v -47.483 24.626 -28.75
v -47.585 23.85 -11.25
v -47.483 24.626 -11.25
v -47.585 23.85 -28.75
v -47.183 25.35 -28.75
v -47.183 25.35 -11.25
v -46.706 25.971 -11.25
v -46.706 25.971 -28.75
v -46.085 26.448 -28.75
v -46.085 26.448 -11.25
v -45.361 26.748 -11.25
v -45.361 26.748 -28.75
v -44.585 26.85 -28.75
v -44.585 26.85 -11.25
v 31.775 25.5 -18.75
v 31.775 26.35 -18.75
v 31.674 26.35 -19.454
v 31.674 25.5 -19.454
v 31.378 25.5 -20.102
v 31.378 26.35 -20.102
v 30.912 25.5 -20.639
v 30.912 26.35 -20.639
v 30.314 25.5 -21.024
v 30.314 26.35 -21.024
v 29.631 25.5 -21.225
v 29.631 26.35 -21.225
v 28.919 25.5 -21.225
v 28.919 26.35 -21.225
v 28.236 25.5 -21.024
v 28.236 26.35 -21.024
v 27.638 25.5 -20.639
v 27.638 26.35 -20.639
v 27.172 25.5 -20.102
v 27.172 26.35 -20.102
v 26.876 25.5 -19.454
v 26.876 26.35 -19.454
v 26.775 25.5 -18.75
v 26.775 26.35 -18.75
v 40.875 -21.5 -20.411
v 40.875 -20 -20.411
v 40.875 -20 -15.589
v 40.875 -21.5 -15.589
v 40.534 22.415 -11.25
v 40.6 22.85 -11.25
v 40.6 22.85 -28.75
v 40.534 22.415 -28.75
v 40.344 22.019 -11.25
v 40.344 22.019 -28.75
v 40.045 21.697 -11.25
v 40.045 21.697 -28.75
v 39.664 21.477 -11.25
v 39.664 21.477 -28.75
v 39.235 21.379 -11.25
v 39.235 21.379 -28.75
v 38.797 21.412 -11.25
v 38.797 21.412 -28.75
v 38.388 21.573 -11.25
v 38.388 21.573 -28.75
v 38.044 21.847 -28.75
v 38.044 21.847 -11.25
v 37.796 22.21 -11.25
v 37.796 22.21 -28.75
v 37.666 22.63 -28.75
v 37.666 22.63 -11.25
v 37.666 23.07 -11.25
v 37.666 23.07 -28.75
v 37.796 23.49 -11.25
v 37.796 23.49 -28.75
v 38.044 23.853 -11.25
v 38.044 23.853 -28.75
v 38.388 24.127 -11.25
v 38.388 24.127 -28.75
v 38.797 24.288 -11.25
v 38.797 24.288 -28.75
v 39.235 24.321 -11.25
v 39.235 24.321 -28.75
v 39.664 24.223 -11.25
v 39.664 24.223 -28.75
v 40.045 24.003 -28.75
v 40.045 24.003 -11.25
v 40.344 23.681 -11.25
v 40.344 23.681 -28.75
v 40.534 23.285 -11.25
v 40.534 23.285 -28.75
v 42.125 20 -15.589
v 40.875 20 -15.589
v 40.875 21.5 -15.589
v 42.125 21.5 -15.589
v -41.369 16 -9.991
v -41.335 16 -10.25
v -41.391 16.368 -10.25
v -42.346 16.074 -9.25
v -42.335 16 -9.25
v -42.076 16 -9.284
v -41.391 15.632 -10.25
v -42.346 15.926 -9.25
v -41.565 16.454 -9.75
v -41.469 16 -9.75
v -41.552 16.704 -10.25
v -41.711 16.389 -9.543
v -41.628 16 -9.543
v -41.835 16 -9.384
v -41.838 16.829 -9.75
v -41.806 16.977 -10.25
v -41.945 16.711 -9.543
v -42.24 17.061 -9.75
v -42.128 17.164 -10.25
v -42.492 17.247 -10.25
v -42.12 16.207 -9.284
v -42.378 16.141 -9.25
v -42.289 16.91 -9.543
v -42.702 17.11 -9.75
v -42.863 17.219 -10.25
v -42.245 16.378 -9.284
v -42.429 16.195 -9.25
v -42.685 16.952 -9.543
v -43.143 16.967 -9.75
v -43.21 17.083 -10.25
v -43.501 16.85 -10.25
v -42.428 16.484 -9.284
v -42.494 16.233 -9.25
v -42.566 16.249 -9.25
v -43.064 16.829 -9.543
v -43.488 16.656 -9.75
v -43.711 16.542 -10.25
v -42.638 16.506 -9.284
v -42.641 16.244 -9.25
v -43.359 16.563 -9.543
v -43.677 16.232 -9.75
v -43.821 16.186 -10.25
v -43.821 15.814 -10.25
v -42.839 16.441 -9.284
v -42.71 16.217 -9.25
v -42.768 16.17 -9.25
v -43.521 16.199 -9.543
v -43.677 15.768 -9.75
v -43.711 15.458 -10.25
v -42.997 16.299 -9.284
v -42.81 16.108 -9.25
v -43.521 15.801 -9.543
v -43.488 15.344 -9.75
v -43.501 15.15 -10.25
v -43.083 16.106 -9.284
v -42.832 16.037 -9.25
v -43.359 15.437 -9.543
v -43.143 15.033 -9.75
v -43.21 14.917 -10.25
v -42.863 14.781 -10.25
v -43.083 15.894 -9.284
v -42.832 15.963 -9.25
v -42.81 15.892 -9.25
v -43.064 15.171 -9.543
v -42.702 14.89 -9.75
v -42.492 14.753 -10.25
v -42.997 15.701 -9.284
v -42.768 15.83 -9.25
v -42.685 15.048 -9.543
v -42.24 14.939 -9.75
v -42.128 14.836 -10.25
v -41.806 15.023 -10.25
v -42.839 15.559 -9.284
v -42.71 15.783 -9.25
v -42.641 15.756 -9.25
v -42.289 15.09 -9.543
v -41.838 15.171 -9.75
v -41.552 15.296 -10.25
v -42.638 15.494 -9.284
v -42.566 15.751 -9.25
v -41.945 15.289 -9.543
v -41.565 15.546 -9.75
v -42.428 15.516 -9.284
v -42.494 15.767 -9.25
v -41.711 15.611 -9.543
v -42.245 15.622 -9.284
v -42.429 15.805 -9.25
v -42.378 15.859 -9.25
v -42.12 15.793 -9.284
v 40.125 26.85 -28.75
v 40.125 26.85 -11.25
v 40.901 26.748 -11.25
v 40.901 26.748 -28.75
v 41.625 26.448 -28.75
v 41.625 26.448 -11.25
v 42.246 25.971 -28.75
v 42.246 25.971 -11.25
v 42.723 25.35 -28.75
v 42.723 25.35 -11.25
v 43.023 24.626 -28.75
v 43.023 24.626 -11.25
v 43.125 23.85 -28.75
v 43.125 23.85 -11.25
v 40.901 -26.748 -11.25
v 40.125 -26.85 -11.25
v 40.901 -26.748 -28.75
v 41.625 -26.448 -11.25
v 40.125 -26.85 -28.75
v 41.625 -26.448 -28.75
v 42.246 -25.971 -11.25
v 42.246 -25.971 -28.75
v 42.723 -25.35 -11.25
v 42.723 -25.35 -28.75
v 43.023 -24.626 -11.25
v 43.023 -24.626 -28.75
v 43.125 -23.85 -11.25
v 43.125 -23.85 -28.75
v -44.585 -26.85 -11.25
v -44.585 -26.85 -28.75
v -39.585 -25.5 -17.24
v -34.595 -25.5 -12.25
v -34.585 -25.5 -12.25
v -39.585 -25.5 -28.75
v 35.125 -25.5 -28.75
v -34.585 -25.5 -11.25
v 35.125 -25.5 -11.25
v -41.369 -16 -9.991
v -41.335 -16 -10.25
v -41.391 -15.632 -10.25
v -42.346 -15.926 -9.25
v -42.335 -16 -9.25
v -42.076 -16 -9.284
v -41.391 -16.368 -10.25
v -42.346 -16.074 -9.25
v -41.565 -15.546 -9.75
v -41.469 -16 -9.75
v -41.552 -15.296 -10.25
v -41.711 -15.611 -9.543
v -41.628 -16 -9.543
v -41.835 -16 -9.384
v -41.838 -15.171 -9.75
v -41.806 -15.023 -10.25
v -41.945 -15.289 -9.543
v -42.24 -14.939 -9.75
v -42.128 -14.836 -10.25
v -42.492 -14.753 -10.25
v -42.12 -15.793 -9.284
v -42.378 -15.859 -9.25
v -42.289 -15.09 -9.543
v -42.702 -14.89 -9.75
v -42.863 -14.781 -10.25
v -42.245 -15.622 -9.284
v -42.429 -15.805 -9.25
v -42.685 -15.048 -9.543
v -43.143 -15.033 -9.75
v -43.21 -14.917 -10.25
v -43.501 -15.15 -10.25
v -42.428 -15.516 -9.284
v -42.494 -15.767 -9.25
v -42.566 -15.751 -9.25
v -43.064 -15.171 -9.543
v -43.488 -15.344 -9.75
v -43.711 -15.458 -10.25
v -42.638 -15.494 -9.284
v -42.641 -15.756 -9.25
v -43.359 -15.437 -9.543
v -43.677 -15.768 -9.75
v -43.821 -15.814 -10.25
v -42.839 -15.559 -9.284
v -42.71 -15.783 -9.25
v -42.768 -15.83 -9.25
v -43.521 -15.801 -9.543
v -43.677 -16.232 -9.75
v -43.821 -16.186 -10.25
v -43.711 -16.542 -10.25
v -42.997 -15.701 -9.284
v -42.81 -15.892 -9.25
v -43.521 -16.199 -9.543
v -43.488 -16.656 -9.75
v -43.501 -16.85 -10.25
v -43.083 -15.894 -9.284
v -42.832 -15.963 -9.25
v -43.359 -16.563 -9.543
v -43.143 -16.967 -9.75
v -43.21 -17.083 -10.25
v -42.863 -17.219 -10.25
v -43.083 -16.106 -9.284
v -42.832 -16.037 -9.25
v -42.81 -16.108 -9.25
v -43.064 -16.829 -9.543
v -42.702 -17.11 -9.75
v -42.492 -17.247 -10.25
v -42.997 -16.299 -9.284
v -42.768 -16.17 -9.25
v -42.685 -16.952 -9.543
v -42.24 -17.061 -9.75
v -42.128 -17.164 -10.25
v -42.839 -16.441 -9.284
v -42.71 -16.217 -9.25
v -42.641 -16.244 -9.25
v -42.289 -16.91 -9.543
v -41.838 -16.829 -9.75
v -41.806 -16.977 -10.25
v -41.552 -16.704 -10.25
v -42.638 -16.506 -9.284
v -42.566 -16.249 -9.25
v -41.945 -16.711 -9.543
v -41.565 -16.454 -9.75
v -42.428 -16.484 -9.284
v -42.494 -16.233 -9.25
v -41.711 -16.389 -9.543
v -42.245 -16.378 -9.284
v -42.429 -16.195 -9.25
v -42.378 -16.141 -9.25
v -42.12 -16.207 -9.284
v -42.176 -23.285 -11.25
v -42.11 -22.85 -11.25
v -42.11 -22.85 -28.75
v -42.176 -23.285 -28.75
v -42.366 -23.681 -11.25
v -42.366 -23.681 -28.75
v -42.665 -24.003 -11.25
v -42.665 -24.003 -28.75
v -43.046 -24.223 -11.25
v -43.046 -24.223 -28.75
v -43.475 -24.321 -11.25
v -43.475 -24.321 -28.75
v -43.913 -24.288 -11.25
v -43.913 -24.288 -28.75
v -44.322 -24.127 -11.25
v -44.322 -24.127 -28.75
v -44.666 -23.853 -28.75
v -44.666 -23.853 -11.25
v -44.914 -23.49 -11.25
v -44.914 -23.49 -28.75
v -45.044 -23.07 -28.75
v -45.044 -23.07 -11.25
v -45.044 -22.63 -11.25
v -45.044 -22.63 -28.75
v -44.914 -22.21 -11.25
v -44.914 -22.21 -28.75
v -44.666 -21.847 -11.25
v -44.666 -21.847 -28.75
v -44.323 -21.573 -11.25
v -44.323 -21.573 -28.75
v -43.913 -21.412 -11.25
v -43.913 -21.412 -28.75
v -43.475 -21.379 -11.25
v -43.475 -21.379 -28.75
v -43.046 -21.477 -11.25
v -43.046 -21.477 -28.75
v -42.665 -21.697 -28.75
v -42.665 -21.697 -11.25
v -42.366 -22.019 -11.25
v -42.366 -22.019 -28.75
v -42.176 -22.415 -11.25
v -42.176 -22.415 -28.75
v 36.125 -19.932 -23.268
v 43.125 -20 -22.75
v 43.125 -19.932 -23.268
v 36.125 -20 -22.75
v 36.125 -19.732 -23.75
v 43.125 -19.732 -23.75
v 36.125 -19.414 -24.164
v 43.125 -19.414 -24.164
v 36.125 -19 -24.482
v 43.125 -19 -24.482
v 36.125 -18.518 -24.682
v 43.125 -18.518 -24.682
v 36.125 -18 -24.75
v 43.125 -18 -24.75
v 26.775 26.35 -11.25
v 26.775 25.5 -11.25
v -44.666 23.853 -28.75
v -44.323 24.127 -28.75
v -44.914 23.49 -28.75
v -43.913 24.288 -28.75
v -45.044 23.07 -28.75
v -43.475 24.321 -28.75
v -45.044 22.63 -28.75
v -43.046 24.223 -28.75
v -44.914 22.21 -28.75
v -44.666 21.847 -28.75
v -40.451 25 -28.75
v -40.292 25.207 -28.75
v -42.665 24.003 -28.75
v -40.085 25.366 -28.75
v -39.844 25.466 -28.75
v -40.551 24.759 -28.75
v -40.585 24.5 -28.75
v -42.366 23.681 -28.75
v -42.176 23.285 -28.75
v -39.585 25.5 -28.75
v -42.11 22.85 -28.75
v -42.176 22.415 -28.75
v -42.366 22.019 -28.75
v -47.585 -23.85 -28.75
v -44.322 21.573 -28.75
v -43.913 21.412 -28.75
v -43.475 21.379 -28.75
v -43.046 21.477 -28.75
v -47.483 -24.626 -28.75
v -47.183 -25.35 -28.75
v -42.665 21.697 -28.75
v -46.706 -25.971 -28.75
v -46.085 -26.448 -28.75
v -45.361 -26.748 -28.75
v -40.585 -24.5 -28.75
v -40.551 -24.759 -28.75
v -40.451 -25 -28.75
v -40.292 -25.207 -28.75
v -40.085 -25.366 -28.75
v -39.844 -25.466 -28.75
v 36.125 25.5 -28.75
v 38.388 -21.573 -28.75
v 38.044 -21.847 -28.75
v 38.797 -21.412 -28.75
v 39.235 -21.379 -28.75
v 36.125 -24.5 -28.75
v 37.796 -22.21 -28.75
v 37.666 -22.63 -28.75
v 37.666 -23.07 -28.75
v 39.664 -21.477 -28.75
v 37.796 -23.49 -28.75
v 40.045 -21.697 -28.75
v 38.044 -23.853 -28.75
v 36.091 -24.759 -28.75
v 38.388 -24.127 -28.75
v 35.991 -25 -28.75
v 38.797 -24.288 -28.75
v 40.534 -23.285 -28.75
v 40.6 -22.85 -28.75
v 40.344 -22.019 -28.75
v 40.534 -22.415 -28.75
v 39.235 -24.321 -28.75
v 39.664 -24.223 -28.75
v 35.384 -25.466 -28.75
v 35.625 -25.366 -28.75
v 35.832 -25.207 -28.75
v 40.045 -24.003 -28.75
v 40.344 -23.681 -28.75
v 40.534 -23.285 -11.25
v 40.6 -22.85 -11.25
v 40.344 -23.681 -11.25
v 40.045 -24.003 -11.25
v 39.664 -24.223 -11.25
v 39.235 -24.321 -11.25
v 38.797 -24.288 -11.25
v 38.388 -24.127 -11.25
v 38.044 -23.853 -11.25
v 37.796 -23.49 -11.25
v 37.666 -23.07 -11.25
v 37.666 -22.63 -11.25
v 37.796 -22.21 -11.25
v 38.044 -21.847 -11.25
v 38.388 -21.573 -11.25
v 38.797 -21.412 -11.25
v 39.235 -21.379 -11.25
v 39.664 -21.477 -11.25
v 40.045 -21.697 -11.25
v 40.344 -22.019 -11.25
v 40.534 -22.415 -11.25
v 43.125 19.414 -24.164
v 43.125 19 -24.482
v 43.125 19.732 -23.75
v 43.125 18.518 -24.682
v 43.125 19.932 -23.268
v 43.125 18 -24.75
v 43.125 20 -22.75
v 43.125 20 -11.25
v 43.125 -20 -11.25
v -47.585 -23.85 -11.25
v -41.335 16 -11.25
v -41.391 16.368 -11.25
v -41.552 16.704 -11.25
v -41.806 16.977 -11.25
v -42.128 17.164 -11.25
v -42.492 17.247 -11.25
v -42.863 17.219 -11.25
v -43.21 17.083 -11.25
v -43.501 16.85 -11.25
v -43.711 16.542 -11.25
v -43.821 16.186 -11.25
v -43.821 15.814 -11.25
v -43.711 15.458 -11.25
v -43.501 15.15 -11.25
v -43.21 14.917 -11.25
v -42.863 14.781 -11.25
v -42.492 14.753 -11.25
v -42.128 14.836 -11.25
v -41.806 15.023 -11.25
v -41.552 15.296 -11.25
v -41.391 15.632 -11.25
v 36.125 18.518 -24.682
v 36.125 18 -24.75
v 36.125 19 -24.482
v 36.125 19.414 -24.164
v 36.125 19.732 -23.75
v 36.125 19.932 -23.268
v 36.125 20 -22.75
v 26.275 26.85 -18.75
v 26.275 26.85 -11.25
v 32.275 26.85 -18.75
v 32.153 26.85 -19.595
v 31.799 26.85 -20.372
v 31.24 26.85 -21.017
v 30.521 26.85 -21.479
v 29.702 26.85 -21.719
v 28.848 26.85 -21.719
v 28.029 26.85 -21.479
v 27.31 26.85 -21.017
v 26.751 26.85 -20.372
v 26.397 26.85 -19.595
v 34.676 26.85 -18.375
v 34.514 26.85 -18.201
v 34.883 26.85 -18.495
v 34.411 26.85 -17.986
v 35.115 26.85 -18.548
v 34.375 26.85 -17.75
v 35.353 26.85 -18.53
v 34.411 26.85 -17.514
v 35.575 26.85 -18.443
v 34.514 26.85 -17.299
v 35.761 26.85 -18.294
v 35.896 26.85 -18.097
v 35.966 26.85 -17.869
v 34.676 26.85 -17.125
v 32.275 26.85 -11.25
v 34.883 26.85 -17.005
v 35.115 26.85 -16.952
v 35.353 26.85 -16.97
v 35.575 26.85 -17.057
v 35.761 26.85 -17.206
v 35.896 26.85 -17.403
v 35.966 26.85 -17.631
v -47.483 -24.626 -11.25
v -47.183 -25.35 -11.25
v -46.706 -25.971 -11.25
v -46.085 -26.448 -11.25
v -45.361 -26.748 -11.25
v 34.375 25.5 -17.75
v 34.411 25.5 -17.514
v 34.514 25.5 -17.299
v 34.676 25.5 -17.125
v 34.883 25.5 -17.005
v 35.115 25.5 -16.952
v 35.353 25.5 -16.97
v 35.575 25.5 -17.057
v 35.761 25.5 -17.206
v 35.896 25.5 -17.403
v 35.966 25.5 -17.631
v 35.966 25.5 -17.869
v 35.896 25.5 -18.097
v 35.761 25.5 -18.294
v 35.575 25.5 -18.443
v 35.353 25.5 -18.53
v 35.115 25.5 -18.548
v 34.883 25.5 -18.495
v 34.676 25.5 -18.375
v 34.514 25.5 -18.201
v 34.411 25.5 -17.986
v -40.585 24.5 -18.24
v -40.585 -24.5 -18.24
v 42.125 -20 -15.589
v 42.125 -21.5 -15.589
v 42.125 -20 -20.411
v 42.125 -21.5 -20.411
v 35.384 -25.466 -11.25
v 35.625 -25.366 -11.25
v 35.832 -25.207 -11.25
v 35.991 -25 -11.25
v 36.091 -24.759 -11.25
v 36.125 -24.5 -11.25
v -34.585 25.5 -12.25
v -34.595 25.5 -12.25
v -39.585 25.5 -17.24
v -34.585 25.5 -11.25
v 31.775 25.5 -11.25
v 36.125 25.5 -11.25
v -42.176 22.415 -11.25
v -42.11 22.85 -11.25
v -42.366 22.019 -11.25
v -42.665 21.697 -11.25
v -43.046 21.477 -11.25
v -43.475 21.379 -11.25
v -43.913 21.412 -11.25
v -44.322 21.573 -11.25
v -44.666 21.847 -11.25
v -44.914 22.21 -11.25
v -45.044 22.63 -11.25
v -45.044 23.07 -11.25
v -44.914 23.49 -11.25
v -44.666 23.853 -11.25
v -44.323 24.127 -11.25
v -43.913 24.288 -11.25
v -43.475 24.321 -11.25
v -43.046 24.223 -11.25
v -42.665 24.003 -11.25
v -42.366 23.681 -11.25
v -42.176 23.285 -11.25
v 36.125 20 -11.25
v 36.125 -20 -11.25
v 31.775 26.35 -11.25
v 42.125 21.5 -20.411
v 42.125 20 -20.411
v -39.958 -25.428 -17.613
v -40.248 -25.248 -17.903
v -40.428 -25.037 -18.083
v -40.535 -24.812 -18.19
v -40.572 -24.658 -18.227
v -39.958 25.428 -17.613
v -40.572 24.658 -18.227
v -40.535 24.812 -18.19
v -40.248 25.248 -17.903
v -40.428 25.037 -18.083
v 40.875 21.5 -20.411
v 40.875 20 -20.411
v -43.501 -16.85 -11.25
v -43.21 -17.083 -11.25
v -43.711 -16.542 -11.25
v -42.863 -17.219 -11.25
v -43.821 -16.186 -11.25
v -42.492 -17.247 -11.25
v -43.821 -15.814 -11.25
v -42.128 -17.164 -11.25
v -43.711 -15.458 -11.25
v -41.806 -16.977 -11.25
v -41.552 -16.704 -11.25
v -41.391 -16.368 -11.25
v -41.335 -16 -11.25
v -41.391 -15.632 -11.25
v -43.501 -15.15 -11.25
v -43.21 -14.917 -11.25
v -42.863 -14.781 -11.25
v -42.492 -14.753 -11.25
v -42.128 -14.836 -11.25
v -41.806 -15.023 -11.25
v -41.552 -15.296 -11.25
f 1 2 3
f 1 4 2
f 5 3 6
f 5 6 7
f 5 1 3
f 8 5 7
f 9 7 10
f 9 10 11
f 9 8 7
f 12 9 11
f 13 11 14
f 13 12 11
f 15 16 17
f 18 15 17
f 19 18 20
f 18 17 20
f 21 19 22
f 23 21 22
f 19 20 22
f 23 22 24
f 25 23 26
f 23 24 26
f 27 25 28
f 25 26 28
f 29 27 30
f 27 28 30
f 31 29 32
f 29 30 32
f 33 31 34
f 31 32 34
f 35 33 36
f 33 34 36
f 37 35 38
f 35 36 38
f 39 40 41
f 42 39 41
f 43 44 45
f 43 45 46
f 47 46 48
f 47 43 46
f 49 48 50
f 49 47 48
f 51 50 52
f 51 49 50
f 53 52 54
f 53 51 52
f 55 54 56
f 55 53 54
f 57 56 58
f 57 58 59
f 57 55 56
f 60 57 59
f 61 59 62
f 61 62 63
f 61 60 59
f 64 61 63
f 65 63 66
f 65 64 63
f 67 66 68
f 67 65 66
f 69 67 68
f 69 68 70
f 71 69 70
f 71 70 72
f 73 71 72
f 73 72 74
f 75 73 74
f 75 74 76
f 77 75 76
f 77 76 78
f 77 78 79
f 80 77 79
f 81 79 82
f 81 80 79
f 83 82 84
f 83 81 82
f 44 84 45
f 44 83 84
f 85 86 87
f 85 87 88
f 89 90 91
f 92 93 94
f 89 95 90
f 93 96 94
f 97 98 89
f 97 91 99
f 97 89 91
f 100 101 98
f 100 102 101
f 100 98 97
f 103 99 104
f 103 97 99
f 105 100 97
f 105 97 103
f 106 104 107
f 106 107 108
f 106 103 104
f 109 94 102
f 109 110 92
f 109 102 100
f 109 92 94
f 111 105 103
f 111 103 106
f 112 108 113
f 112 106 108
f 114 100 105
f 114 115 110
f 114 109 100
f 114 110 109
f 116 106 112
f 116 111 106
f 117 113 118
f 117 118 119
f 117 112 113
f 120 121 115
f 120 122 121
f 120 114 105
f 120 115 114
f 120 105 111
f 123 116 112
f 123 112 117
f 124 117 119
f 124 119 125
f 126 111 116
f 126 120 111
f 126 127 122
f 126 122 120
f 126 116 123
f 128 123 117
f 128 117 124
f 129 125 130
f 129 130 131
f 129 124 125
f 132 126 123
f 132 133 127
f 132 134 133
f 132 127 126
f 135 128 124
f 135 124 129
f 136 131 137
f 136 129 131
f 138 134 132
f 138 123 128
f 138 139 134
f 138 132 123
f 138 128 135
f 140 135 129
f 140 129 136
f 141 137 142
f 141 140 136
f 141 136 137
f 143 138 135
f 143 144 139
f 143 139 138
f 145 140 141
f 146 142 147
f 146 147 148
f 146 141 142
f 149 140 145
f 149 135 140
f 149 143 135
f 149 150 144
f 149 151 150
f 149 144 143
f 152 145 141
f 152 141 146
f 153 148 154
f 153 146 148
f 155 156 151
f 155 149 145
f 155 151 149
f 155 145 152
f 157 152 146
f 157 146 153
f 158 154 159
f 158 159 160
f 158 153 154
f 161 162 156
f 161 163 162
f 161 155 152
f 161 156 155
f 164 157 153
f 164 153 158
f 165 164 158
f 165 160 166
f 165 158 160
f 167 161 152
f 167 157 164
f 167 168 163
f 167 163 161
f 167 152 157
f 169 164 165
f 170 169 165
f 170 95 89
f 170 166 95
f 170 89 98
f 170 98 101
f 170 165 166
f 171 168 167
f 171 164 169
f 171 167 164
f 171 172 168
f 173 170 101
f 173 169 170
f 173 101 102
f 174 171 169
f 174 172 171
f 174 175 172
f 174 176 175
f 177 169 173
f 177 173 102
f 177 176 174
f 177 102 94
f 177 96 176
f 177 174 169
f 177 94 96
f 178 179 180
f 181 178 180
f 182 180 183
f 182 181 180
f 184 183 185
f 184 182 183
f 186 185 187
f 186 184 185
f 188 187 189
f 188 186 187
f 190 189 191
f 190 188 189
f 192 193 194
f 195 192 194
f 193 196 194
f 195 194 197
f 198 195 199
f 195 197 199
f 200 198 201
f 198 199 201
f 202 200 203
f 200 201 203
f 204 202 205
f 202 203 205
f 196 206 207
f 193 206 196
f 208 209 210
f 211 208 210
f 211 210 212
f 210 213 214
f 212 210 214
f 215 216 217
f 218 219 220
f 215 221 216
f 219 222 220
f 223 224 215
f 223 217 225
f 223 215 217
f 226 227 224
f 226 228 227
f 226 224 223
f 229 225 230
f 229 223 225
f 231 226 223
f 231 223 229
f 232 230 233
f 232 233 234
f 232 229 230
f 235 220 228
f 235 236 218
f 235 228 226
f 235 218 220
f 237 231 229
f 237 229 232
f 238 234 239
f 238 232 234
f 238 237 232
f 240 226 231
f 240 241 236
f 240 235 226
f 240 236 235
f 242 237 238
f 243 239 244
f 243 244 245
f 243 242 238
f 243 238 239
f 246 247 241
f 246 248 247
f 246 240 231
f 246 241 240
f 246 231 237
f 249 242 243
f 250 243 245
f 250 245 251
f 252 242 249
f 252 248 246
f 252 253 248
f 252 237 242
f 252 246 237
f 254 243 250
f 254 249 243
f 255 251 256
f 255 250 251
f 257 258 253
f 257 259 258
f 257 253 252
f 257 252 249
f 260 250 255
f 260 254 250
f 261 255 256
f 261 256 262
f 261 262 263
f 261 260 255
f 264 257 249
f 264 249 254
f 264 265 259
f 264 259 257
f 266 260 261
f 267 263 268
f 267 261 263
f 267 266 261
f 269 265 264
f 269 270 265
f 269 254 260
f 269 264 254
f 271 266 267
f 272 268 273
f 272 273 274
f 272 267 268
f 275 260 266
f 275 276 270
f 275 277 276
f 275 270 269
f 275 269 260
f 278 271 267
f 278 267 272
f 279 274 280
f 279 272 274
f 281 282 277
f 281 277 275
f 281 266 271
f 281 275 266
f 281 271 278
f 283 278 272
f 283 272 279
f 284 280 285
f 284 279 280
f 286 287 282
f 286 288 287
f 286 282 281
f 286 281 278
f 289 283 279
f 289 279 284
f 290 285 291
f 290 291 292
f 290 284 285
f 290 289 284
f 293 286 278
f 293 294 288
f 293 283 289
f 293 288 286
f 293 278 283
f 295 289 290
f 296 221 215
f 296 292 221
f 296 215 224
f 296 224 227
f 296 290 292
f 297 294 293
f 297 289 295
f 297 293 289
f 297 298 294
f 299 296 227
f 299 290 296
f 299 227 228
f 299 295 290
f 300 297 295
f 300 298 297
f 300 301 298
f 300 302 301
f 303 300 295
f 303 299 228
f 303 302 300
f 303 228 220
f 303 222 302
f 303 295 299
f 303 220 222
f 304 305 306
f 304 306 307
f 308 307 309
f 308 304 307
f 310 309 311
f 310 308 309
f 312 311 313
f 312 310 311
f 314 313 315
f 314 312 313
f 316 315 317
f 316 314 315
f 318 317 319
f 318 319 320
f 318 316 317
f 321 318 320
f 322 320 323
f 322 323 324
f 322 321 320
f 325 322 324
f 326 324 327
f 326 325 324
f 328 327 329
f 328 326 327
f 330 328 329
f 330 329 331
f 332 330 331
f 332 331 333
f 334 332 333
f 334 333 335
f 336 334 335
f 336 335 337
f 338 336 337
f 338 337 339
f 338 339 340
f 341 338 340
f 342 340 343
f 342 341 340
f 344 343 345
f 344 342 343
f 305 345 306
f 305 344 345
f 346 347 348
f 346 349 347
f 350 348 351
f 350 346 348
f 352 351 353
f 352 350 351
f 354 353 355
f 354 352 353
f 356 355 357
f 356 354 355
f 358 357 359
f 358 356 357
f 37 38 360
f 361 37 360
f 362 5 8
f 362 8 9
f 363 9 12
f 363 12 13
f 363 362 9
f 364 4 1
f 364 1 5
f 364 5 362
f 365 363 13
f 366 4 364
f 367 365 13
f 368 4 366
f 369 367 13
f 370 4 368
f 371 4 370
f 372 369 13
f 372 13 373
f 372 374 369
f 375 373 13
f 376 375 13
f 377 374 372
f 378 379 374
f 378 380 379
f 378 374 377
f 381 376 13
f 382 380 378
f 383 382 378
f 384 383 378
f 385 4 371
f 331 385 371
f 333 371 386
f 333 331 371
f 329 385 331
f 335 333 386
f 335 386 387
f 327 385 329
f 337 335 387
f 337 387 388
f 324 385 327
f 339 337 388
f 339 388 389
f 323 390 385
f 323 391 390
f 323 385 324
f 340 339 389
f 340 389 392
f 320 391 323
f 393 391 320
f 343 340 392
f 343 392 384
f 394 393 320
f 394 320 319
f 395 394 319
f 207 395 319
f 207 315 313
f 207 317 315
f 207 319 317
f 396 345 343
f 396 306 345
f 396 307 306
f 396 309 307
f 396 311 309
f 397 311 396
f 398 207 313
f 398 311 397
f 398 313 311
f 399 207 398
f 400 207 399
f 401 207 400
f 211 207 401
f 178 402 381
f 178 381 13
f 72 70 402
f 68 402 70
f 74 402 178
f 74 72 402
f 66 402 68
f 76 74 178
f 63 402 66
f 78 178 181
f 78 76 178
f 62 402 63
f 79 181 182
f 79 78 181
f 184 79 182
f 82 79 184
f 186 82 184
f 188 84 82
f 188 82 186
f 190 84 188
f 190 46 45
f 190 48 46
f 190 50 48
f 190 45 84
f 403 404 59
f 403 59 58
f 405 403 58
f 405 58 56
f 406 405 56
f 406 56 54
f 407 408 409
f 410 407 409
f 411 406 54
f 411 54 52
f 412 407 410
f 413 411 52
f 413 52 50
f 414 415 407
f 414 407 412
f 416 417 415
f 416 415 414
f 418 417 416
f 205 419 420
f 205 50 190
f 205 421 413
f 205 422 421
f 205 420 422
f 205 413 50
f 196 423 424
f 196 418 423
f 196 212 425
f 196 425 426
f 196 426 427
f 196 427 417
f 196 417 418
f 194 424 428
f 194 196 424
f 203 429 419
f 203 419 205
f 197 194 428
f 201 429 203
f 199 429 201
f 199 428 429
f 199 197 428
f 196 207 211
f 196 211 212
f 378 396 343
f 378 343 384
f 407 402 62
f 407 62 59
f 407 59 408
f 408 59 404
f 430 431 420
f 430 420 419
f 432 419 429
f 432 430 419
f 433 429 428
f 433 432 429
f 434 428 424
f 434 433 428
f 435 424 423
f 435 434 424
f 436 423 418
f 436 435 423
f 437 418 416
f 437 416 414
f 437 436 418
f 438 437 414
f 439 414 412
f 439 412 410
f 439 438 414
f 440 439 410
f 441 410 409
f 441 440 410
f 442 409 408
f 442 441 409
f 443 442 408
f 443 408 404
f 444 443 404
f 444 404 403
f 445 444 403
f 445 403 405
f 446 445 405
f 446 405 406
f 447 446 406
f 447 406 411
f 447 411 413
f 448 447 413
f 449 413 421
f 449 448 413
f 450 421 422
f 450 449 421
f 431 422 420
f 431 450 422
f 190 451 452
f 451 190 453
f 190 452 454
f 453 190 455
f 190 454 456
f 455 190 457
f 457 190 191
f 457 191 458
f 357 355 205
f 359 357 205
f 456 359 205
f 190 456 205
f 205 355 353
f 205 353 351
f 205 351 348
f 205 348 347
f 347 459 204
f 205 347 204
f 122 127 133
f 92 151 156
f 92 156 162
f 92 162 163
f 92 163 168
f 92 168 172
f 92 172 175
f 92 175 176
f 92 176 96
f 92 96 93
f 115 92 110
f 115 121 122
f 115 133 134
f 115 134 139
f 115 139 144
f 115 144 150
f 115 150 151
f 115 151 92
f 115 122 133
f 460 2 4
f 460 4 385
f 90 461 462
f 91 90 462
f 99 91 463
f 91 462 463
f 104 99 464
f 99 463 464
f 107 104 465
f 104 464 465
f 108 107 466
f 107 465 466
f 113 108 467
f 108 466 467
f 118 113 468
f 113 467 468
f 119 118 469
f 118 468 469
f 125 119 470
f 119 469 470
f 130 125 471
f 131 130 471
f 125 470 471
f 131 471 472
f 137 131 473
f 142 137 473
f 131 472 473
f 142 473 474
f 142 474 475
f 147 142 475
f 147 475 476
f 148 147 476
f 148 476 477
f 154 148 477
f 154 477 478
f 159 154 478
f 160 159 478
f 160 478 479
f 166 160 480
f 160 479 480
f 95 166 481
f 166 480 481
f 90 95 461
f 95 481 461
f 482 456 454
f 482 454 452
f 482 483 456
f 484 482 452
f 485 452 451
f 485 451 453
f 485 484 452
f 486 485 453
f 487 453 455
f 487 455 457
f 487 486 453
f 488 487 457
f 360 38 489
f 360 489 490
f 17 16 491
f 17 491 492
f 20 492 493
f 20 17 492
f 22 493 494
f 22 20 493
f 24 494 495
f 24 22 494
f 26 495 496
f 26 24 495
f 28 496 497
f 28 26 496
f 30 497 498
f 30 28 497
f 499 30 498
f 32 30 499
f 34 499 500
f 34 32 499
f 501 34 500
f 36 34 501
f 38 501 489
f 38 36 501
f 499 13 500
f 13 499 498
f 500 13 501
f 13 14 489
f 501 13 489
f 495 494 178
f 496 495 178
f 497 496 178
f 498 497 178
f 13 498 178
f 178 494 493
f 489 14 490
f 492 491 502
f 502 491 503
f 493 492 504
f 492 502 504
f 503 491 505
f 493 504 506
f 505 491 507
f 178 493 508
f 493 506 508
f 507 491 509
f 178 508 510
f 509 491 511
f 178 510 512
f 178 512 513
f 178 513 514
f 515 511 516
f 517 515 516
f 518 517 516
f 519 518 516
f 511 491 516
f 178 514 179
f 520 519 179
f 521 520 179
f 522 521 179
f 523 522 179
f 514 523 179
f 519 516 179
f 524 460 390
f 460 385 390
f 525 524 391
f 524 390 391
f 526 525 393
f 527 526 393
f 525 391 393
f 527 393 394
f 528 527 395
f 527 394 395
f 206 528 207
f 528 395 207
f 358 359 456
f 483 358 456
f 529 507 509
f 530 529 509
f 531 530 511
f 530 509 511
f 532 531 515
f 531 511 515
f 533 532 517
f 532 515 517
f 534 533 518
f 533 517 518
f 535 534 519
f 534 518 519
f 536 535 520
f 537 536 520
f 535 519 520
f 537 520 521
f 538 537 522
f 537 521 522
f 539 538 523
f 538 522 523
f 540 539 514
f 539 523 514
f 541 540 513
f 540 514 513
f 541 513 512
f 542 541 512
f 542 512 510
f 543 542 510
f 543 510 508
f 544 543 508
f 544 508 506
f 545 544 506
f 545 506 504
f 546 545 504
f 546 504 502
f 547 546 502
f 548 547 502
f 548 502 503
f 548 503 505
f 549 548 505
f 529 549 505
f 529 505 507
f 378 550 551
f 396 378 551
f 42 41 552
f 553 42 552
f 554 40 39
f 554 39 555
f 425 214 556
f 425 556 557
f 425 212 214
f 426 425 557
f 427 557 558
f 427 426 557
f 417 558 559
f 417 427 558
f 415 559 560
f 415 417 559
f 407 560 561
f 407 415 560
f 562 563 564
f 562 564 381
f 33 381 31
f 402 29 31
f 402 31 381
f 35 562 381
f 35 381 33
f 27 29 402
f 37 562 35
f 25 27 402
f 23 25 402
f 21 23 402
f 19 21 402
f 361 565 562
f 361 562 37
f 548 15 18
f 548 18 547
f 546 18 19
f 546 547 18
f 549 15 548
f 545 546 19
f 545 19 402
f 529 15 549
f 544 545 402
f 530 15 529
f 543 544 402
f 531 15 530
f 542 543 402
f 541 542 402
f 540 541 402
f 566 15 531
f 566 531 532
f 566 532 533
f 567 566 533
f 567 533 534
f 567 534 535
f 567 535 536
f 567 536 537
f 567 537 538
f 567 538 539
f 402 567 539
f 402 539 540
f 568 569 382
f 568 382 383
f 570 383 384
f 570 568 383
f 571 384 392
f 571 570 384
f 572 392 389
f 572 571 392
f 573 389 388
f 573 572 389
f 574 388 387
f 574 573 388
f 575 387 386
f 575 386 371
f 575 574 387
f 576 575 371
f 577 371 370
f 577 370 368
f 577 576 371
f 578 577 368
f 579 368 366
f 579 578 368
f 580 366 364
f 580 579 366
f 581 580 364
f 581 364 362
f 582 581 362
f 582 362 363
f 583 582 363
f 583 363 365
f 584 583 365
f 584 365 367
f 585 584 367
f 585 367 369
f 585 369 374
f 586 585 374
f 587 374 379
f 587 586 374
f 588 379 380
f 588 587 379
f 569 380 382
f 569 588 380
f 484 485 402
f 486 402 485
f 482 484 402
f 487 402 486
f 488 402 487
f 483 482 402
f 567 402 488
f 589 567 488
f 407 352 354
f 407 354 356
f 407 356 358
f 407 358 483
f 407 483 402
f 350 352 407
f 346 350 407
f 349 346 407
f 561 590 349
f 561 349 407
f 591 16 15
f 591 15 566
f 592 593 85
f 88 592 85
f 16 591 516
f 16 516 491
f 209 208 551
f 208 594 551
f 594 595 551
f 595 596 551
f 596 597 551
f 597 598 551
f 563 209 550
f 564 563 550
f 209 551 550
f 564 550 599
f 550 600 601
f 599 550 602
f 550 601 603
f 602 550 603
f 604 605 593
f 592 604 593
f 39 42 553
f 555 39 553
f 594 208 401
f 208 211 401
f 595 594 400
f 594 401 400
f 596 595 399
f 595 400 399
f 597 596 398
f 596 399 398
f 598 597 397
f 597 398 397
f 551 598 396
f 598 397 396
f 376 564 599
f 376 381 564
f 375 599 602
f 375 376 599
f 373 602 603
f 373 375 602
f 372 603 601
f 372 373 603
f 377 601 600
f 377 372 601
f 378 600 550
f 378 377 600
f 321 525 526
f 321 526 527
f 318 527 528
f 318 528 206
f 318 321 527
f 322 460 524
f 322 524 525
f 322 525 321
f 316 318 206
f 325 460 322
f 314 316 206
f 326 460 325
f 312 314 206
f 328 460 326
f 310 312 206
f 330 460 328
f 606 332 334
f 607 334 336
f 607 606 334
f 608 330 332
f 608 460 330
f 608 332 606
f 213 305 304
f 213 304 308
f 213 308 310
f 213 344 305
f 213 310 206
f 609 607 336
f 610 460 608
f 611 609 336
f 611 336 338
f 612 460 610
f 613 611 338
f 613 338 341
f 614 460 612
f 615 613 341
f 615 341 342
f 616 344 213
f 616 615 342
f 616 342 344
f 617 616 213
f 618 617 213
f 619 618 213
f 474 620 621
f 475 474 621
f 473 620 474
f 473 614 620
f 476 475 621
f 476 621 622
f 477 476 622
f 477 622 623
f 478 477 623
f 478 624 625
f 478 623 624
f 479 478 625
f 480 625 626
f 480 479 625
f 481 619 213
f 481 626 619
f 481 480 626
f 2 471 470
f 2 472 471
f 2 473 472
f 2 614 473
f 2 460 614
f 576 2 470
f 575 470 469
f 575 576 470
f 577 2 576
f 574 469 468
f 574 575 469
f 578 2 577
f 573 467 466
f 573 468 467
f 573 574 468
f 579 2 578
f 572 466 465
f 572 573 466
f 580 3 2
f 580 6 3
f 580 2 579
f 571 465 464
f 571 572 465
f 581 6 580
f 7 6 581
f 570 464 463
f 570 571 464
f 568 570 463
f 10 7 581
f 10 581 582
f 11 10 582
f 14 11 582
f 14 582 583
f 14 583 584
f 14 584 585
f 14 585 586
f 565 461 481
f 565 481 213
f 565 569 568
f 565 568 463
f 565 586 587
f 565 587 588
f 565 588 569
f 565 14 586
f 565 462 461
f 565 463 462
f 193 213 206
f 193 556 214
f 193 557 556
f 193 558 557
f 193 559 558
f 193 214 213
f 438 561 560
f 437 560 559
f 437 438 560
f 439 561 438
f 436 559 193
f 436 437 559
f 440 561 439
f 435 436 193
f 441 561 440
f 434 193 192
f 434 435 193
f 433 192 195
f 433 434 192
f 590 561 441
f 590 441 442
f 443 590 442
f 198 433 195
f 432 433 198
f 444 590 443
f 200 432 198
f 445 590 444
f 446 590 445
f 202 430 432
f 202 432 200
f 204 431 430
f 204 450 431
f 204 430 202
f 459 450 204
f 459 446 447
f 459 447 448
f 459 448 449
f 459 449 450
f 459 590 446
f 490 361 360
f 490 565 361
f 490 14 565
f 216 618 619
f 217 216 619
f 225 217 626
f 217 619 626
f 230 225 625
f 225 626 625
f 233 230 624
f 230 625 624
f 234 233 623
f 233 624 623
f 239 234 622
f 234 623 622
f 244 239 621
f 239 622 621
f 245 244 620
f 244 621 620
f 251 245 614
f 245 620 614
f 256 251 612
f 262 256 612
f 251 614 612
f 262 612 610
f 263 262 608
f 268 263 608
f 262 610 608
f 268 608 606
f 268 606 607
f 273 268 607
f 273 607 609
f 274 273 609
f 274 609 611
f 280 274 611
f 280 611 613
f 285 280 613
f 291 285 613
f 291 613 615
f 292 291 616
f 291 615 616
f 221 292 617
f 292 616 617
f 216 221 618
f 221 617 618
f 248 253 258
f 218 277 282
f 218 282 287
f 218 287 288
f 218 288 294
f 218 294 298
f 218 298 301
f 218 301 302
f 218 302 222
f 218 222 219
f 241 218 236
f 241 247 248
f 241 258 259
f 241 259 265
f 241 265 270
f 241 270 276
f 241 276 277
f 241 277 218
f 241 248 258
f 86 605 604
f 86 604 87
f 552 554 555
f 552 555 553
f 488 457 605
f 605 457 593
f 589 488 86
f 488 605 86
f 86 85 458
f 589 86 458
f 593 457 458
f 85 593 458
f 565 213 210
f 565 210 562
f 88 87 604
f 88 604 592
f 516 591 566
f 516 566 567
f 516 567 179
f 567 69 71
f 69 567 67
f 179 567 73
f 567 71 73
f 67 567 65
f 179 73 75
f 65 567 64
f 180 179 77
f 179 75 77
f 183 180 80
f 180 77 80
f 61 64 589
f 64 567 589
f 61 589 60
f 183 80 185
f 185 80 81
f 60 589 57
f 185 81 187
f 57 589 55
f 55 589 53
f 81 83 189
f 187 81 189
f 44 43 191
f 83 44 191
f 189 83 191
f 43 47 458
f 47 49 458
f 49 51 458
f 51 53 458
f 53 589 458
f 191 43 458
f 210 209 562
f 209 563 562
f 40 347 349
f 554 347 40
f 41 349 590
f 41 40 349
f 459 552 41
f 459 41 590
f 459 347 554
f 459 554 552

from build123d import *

# Parameters (mm, degrees)
SKETCH008_W     = 90.71
SKETCH008_H     = 53.7
SKETCH008_R     = 1.475
SKETCH008_W_2   = 76.71
SKETCH008_H_2   = 51
PAD002_DEPTH    = 17.5
FILLET001_R     = 3
SKETCH009_R     = 0.8
POCKET005_DEPTH = 5
SKETCH010_W     = 40
SKETCH010_H     = 13.5
POCKET006_DEPTH = 7
SKETCH012_W     = 6
SKETCH012_H     = 51
PAD003_DEPTH    = 1
CHAMFER_SIZE    = 5.99
SKETCH015_R     = 1.25
PAD004_DEPTH    = 2
FILLET005_R     = 1
FILLET006_R     = 1
FILLET007_R     = 2
SKETCH016_W     = 1.25
SKETCH016_H     = 4.821428
POCKET009_DEPTH = 1.5
CHAMFER002_SIZE = 0.5


with BuildPart() as part:
    # Sketch008 (on Face1 of CopyCopyHole) → Pad002 (new body)
    with BuildSketch(Plane(origin=(0, 0, -11.25), x_dir=(1, 0, 0), z_dir=(0, 0, -1))):
        with Locations((-2.23, 0)):
            Rectangle(SKETCH008_W, SKETCH008_H)
        with Locations((-43.585, 22.85)):
            Circle(SKETCH008_R, mode=Mode.SUBTRACT)
        with Locations((-43.585, -22.85)):
            Circle(SKETCH008_R, mode=Mode.SUBTRACT)
        with Locations((39.125, 22.85)):
            Circle(SKETCH008_R, mode=Mode.SUBTRACT)
        with Locations((39.125, -22.85)):
            Circle(SKETCH008_R, mode=Mode.SUBTRACT)
        with Locations((-2.23, 0)):
            Rectangle(SKETCH008_W_2, SKETCH008_H_2, mode=Mode.SUBTRACT)
    extrude(amount=PAD002_DEPTH)

    # Fillet001
    fillet001_edges = [part.edges().sort_by_distance(p)[0] for p in [
        (43.125, 26.85, -20),
        (-47.585, 26.85, -20),
        (-47.585, -26.85, -20),
        (43.125, -26.85, -20),
    ]]
    fillet(fillet001_edges, radius=FILLET001_R)

    # Sketch009 (on Face10 of Fillet001) → Pocket005 (cut)
    with BuildSketch(Plane(origin=(0, 26.85, 0), x_dir=(-1, 0, 0), z_dir=(0, 1, 0))):
        with Locations((-35.175, -17.75)):
            Circle(SKETCH009_R)
        with BuildLine():
            ThreePointArc((-31.775, -18.75), (-29.275, -21.25), (-26.775, -18.75))
            Line((-26.775, -18.75), (-26.775, -11.25))
            ThreePointArc((-26.775, -11.25), (-29.275, -8.75), (-31.775, -11.25))
            Line((-31.775, -18.75), (-31.775, -11.25))
        make_face()
    extrude(amount=-POCKET005_DEPTH, mode=Mode.SUBTRACT)

    # Sketch010 (on Face7 of Fillet001) → Pocket006 (cut)
    with BuildSketch(Plane.YZ.offset(43.125)):
        with Locations((0, -18)):
            Rectangle(SKETCH010_W, SKETCH010_H)
    extrude(amount=-POCKET006_DEPTH, mode=Mode.SUBTRACT)

    # Sketch012 (on Face2 of Pocket006) → Pad003 (join)
    with BuildSketch(Plane.XY.offset(-11.25)):
        with Locations((-37.585, 0)):
            Rectangle(SKETCH012_W, SKETCH012_H)
    extrude(amount=-PAD003_DEPTH)

    # Chamfer
    chamfer_edges = [part.edges().sort_by_distance(p)[0] for p in [
        (-40.585, 0, -12.25),
    ]]
    chamfer(chamfer_edges, length=CHAMFER_SIZE)

    # Sketch015 (on Face9 of Chamfer) → Pad004 (join)
    with BuildSketch(Plane.XY.offset(-11.25)):
        with Locations((-42.585, 16)):
            Circle(SKETCH015_R)
        with Locations((-42.585, -16)):
            Circle(SKETCH015_R)
    extrude(amount=PAD004_DEPTH)

    # Fillet005
    fillet005_edges = [part.edges().sort_by_distance(p)[0] for p in [
        (-43.835, -16, -9.25),
        (-43.835, 16, -9.25),
    ]]
    fillet(fillet005_edges, radius=FILLET005_R)

    # Fillet006
    fillet006_edges = [part.edges().sort_by_distance(p)[0] for p in [
        (36.125, -25.5, -20),
        (-40.585, -25.5, -23.495),
        (-40.585, 25.5, -23.495),
    ]]
    fillet(fillet006_edges, radius=FILLET006_R)

    # Fillet007
    fillet007_edges = [part.edges().sort_by_distance(p)[0] for p in [
        (39.625, 20, -24.75),
        (39.625, -20, -24.75),
    ]]
    fillet(fillet007_edges, radius=FILLET007_R)

    # Sketch016 (on Face9 of Fillet007) → Pocket009 (cut)
    with BuildSketch(Plane.XZ.offset(-20)):
        with Locations((41.5, -18)):
            Rectangle(SKETCH016_W, SKETCH016_H)
    pocket009 = extrude(amount=-POCKET009_DEPTH, mode=Mode.SUBTRACT)

    # Mirrored001: Pocket009 across XZ
    add(pocket009.mirror(Plane.XZ), mode=Mode.SUBTRACT)

    # Chamfer002
    chamfer002_edges = [part.edges().sort_by_distance(p)[0] for p in [
        (29.275, 26.85, -21.25),
    ]]
    chamfer(chamfer002_edges, length=CHAMFER002_SIZE)


solid = part.part
